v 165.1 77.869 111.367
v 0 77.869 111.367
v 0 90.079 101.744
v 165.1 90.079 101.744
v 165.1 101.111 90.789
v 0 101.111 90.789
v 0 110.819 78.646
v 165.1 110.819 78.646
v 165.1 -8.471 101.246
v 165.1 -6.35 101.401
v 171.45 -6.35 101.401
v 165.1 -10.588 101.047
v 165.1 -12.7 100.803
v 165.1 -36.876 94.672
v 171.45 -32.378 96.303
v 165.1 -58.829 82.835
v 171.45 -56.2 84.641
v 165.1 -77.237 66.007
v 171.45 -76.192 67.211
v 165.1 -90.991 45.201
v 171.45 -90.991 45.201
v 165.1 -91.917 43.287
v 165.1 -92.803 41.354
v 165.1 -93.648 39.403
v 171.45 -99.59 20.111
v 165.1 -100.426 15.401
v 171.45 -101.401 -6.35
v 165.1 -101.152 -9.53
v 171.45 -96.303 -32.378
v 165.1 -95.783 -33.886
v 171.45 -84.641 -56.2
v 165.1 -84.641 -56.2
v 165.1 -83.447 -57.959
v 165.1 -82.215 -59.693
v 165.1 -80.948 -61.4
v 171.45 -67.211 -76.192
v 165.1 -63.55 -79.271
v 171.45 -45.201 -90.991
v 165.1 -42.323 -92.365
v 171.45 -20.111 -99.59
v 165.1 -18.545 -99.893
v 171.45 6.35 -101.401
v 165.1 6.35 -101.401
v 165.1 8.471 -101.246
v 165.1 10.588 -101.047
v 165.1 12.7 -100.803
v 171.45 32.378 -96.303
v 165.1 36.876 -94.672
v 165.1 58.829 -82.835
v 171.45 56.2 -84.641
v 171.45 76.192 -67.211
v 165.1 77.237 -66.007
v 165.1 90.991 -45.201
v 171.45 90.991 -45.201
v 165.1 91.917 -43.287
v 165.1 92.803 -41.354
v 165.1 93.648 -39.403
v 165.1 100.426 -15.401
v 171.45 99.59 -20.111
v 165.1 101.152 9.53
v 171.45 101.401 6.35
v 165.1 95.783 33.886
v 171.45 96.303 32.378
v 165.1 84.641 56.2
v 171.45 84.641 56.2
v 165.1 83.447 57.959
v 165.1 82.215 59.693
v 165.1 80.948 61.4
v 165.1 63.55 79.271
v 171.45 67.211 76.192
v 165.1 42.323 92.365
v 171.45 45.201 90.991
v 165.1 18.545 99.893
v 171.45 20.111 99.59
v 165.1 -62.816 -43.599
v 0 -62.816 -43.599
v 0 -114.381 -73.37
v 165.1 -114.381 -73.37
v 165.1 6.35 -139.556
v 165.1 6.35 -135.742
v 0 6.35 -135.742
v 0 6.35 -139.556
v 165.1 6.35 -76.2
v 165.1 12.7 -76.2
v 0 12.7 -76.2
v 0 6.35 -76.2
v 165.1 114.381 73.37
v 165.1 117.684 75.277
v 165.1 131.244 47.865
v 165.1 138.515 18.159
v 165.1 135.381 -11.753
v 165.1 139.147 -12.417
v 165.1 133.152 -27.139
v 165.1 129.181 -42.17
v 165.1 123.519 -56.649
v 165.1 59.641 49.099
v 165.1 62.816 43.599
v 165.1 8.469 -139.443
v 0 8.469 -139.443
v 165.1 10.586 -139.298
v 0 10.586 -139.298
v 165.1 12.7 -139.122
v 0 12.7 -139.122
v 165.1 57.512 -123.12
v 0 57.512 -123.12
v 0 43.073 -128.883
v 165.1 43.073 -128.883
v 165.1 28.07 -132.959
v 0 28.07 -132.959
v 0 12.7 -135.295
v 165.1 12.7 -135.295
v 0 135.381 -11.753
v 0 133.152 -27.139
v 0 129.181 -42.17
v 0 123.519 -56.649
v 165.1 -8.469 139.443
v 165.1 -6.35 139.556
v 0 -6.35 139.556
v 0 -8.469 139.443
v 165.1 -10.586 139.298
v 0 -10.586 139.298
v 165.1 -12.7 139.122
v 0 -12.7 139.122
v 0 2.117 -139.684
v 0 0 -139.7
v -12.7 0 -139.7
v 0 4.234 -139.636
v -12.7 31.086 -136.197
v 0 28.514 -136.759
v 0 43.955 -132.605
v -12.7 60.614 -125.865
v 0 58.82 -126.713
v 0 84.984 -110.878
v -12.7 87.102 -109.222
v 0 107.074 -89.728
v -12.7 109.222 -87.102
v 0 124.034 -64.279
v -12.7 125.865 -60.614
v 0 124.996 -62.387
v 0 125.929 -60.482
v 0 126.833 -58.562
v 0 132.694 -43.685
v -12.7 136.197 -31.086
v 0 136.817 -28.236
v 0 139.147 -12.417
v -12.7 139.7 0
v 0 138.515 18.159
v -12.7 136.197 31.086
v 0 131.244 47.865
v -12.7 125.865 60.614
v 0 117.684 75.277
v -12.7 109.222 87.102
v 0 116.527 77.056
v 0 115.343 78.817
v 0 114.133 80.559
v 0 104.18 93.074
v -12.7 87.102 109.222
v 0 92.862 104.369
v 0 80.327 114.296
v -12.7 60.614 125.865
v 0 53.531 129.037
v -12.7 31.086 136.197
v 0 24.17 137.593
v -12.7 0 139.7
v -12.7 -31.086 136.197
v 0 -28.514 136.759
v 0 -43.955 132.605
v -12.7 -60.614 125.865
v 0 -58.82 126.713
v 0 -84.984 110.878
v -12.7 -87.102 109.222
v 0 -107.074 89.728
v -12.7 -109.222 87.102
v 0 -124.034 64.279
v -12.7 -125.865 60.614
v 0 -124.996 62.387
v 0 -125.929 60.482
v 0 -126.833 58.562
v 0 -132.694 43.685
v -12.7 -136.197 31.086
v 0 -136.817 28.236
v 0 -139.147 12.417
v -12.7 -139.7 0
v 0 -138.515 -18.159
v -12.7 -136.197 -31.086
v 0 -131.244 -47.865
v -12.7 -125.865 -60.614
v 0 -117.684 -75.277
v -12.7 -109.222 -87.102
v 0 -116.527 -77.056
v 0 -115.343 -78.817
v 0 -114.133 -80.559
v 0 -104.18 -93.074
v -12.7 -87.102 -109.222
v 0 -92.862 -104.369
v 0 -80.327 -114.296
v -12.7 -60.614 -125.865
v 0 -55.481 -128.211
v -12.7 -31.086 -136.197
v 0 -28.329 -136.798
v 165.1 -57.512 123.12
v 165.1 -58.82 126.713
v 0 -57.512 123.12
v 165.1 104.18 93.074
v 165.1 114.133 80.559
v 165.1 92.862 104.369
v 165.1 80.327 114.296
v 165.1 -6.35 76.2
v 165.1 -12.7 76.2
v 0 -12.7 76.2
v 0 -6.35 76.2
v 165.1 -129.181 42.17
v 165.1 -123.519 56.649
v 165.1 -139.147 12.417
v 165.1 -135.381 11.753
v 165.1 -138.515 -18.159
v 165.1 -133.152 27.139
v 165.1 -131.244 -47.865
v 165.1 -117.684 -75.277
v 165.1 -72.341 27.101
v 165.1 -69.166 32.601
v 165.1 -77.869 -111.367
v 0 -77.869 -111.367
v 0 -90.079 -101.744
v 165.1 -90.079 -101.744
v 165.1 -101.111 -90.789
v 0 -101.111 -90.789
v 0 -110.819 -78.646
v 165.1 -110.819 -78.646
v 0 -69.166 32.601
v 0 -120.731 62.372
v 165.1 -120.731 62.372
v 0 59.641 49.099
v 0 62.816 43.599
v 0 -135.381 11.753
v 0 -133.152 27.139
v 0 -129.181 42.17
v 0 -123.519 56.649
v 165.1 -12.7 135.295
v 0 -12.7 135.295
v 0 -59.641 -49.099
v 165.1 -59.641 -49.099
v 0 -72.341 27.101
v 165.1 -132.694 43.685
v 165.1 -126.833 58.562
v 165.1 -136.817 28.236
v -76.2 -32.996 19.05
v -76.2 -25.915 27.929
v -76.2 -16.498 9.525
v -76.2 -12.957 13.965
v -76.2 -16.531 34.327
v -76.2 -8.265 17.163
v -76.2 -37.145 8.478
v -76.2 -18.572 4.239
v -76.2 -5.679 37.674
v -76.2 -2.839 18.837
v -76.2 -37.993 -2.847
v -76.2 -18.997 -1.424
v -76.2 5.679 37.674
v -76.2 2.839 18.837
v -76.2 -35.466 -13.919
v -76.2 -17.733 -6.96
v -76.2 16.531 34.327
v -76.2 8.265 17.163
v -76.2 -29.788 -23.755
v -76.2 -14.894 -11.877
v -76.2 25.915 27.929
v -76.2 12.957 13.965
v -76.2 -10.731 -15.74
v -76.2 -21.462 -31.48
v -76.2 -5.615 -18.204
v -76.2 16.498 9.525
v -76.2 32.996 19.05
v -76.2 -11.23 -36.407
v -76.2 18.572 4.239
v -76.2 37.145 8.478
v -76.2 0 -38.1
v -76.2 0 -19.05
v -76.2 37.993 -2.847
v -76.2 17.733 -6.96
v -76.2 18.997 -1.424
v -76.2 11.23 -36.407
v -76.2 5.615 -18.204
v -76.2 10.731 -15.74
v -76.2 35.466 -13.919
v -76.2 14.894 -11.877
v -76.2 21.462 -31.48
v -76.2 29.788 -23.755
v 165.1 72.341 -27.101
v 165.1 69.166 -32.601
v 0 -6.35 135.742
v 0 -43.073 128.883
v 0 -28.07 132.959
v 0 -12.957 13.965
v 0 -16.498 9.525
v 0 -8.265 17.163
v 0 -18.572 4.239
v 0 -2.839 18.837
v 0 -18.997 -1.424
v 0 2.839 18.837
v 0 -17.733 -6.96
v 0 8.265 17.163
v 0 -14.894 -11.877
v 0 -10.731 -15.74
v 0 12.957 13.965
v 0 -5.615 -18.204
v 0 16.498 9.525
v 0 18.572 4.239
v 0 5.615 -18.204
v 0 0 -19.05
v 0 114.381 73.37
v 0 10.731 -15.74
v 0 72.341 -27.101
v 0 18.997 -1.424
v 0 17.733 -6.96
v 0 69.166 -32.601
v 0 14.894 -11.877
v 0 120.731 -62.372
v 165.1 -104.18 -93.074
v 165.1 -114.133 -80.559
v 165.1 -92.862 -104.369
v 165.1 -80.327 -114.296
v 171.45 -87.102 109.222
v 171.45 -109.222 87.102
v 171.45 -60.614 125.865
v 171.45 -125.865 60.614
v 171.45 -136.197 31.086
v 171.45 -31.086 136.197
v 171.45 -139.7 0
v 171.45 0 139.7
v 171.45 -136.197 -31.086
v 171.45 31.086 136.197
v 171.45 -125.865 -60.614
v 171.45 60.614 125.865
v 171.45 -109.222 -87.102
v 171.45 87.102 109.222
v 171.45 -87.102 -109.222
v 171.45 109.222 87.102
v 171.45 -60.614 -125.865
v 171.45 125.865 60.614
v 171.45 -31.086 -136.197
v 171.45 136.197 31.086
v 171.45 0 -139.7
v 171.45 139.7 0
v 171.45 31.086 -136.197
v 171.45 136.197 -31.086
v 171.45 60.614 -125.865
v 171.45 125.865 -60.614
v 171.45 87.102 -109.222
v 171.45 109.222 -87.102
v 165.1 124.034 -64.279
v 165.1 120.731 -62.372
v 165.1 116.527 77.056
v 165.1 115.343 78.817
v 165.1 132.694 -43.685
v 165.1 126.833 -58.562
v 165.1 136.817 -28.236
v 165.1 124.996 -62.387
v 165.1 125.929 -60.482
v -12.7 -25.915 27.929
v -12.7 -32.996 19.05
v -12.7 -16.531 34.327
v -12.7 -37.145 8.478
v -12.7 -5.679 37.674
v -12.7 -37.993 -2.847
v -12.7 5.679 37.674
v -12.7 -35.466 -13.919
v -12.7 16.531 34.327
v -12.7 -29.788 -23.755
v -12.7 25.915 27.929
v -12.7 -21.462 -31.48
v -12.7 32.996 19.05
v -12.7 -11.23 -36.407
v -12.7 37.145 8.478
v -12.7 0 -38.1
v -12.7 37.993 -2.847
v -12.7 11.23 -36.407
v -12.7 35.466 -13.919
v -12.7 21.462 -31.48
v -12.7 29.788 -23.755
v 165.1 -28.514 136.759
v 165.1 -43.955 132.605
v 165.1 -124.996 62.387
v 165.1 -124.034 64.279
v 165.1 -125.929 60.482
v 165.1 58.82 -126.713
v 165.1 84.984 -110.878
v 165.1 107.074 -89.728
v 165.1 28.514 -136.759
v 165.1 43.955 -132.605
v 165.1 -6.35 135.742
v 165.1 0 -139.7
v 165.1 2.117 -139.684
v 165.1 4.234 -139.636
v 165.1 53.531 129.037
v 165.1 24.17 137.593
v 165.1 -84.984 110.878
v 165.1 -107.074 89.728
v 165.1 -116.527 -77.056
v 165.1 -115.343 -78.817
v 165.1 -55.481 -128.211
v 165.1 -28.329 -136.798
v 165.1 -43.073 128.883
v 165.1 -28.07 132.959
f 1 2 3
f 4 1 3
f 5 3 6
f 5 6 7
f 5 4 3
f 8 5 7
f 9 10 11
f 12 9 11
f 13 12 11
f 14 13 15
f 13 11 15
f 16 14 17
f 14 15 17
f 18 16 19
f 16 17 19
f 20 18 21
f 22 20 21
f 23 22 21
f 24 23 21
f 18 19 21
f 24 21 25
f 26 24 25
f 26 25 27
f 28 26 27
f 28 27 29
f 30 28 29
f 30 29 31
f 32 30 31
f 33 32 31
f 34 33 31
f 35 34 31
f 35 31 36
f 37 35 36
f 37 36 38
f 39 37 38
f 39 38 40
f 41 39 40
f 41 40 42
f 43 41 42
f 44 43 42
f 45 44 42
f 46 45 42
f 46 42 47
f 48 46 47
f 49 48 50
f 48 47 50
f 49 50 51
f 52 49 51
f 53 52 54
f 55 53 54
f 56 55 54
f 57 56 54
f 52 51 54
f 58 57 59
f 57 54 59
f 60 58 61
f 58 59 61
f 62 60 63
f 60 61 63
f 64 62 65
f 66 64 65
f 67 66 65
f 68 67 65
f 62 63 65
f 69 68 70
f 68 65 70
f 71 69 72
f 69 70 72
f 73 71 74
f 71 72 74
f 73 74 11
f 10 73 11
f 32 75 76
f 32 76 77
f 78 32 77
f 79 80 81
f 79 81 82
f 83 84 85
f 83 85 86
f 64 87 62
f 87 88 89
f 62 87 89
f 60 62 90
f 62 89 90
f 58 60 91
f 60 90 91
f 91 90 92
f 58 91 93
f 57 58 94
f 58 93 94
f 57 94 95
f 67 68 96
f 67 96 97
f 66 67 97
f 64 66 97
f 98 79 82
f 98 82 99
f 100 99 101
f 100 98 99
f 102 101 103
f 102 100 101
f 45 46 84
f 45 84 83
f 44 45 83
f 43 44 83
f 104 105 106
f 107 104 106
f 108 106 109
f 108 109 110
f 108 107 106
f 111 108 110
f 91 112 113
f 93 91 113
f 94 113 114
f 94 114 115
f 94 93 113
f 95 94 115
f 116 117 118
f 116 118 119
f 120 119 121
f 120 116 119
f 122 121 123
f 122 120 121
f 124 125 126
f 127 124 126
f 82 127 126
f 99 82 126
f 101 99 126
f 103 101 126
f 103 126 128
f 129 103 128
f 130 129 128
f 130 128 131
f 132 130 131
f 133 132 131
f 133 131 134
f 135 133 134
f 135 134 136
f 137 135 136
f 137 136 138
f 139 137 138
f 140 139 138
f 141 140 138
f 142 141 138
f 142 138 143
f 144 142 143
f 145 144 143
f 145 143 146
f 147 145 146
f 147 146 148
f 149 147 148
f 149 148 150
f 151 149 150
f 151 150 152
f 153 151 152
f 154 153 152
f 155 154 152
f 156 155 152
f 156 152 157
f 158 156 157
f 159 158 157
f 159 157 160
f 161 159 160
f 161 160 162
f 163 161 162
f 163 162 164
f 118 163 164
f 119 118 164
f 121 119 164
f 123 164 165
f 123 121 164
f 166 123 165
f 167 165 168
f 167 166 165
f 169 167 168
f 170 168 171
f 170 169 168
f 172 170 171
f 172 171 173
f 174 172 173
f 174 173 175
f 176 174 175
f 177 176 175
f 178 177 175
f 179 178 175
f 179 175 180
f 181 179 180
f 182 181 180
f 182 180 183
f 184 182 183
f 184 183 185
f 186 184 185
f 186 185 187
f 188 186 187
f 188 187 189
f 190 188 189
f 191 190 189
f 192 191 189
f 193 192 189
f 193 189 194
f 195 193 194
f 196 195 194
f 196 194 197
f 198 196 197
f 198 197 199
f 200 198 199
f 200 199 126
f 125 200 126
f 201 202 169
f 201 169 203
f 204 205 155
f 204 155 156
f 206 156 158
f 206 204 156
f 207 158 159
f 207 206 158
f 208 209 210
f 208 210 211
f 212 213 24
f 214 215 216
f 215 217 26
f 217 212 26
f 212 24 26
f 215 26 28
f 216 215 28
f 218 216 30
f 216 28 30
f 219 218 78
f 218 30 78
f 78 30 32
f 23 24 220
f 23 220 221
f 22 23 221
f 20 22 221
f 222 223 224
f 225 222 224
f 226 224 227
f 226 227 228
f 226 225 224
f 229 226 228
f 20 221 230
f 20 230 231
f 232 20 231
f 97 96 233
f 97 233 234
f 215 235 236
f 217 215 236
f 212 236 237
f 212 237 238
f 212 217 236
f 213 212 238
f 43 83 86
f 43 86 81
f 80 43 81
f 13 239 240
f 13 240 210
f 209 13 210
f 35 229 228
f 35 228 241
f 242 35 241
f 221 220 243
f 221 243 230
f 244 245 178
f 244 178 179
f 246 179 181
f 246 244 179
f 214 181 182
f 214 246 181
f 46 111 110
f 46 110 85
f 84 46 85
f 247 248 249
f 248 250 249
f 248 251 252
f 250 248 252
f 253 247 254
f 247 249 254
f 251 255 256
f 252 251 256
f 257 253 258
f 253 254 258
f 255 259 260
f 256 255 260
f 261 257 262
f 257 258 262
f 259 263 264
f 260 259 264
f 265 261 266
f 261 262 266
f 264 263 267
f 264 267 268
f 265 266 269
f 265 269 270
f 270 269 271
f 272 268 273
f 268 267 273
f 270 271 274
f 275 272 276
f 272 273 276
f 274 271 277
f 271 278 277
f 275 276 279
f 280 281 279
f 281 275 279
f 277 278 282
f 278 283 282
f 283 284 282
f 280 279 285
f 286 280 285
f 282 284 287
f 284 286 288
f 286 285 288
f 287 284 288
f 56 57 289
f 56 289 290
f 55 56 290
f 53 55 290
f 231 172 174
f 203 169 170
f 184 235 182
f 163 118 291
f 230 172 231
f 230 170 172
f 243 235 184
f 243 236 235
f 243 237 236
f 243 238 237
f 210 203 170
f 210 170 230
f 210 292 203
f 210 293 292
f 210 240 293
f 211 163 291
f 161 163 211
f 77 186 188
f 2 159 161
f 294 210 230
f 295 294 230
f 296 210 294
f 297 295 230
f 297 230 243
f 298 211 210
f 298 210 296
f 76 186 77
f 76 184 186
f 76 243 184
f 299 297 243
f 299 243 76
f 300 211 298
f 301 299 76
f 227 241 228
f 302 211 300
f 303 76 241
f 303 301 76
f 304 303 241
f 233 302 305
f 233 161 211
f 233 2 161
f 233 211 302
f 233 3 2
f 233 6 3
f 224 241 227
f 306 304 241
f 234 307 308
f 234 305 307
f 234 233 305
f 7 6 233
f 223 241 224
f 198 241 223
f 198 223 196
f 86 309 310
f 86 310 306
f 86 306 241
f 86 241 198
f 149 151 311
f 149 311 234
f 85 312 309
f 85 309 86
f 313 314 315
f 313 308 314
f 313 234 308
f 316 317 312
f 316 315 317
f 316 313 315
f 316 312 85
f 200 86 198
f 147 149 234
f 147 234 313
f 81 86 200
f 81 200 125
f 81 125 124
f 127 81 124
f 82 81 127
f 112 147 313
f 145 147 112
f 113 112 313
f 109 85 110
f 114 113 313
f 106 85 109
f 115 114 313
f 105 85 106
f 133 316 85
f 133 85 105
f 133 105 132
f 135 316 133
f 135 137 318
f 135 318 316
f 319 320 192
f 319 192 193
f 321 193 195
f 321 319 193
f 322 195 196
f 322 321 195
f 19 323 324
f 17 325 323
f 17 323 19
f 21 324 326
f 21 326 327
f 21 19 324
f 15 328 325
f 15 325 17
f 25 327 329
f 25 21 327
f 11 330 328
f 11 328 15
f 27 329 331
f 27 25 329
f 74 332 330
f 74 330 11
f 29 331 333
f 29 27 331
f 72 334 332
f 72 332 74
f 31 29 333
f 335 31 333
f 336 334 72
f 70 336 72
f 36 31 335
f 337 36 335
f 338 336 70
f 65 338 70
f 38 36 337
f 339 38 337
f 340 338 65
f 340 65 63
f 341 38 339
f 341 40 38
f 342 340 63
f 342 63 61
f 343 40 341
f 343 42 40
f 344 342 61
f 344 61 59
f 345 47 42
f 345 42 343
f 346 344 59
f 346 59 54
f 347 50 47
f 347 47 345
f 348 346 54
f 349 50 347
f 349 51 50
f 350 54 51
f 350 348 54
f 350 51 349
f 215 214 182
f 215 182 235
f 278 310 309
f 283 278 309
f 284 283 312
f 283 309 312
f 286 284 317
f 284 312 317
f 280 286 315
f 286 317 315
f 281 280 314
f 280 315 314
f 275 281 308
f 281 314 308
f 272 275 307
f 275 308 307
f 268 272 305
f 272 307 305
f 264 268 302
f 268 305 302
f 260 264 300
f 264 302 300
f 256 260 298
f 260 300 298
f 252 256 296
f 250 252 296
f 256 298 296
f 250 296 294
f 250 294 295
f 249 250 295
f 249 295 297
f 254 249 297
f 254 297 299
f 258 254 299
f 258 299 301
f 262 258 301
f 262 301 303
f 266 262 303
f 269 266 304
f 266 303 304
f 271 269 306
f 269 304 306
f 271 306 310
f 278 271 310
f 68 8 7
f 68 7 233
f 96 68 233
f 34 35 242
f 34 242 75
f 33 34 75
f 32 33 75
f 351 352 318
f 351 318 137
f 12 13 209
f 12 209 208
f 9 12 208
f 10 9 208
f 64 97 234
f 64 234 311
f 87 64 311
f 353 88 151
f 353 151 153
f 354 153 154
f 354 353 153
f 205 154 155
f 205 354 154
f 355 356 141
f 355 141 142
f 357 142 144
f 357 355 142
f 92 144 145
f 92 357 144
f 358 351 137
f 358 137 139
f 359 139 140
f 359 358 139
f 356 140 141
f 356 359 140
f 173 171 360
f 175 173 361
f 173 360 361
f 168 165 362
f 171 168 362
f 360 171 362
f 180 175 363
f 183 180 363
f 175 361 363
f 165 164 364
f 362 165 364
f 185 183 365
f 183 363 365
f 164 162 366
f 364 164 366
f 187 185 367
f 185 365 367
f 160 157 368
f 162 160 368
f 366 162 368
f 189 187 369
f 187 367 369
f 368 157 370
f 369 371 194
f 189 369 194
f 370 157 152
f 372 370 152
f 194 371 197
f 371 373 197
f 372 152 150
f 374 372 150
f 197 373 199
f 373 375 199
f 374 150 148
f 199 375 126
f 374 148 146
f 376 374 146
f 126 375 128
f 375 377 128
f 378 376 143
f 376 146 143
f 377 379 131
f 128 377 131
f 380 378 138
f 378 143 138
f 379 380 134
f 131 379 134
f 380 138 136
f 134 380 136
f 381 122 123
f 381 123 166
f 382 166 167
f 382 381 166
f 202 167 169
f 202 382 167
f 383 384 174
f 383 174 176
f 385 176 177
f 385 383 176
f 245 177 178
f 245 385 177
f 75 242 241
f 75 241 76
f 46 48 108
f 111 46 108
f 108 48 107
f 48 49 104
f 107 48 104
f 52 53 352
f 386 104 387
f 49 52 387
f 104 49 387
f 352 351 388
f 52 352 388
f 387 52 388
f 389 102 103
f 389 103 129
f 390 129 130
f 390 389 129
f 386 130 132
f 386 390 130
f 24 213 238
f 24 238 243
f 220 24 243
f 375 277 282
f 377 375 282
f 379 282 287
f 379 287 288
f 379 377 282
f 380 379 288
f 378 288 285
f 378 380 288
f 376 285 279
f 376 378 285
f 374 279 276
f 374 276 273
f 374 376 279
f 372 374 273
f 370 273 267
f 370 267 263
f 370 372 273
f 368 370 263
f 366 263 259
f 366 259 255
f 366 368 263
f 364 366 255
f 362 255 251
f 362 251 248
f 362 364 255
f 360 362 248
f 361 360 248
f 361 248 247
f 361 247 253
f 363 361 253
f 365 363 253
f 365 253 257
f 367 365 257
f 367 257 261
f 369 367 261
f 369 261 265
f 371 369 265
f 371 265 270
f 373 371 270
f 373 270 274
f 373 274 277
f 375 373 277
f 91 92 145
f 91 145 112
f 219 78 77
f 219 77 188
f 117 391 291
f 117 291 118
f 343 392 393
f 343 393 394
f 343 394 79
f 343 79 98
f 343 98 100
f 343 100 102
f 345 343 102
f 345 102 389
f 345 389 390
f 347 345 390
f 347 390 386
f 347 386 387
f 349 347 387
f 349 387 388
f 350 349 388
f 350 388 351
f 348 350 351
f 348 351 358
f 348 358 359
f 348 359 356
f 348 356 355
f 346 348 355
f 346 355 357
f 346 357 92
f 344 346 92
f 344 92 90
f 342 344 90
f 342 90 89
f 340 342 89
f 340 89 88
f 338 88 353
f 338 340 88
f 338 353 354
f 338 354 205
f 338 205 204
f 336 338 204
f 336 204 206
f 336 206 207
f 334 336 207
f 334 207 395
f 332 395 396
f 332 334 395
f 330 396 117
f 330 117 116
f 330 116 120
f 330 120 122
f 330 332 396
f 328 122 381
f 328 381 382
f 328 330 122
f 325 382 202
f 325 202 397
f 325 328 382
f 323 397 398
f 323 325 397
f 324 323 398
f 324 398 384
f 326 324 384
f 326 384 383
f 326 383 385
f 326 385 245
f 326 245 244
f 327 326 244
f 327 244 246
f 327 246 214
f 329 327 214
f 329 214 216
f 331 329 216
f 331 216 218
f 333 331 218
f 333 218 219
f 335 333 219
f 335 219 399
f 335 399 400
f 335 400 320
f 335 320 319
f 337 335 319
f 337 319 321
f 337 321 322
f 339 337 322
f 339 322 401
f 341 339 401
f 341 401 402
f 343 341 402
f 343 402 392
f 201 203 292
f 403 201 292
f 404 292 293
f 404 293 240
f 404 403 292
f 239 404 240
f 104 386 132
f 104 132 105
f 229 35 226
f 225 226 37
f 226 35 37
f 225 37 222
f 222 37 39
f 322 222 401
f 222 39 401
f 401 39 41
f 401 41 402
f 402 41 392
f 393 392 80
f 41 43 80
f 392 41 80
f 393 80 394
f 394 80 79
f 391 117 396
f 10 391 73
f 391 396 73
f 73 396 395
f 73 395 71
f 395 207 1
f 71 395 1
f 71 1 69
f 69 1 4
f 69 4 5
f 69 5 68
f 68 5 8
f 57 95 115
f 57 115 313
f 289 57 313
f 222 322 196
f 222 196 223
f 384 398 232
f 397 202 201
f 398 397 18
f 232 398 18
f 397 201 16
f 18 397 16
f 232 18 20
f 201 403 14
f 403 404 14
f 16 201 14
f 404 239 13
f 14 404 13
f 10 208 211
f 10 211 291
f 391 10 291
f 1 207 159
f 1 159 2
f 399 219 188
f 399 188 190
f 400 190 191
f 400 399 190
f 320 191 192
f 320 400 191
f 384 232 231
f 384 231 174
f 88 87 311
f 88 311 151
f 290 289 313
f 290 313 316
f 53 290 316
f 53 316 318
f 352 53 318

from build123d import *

# Parameters (mm, degrees)
SKETCH3_R           = 38.1
SKETCH3_R_2         = 19.05
BOSS_EXTRUDE1_DEPTH = 76.2
SKETCH3_3_R         = 139.7
SKETCH3_3_R_2       = 38.1
BOSS_EXTRUDE2_DEPTH = 12.7
BOSS_EXTRUDE5_START = 165.1
BOSS_EXTRUDE5_DEPTH = 165.1
CIRPATTERN1_COUNT   = 6
BOSS_EXTRUDE6_START = 6.35
SKETCH5_R           = 139.7
SKETCH5_R_2         = 101.6
BOSS_EXTRUDE6_DEPTH = 6.35


with BuildPart() as part:
    # Sketch3 → Boss-Extrude1 (new body)
    with BuildSketch(Plane(origin=(0, 0, 0), x_dir=(0, 0, -1), z_dir=(1, 0, 0))):
        Circle(SKETCH3_R)
        Circle(SKETCH3_R_2, mode=Mode.SUBTRACT)
    extrude(amount=-BOSS_EXTRUDE1_DEPTH)

    # Sketch3<3> → Boss-Extrude2 (add)
    with BuildSketch(Plane(origin=(0, 0, 0), x_dir=(0, 0, -1), z_dir=(1, 0, 0))):
        Circle(SKETCH3_3_R)
        Circle(SKETCH3_3_R_2, mode=Mode.SUBTRACT)
    extrude(amount=-BOSS_EXTRUDE2_DEPTH)

    # Sketch4<4> → Boss-Extrude5 (add)
    with BuildSketch(Plane(origin=(0, 0, 0), x_dir=(0, 0, -1), z_dir=(1, 0, 0)).offset(BOSS_EXTRUDE5_START)):
        with BuildLine():
            Line((-49.098522628, 59.641135768), (-43.599261314, 62.816135768))
            Line((-43.599261314, 62.816135768), (-75.277064912, 117.683701073))
            ThreePointArc((-75.277064912, 117.683701073), (-96.609488412, 100.909349165), (-114.296295848, 80.32712341))
            Line((-114.296295848, 80.32712341), (-111.366656278, 77.868863928))
            ThreePointArc((-111.366656278, 77.868863928), (-96.424300498, 95.752004541), (-78.646142874, 110.819115278))
            Line((-78.646142874, 110.819115278), (-49.098522628, 59.641135768))
        make_face()
    boss_extrude5 = extrude(amount=-BOSS_EXTRUDE5_DEPTH)

    # CirPattern1: Boss-Extrude5 ×6 about axis
    cirpattern1_axis = Axis((0, 0, 0), (1, 0, 0))
    for i in range(1, CIRPATTERN1_COUNT):
        add(boss_extrude5.rotate(cirpattern1_axis, i * 360 / CIRPATTERN1_COUNT))

    # Sketch5 → Boss-Extrude6 (add)
    with BuildSketch(Plane(origin=(165.1, 0, 0), x_dir=(0, 0, -1), z_dir=(1, 0, 0)).offset(BOSS_EXTRUDE6_START)):
        Circle(SKETCH5_R)
        Circle(SKETCH5_R_2, mode=Mode.SUBTRACT)
    extrude(amount=-BOSS_EXTRUDE6_DEPTH)


solid = part.part
